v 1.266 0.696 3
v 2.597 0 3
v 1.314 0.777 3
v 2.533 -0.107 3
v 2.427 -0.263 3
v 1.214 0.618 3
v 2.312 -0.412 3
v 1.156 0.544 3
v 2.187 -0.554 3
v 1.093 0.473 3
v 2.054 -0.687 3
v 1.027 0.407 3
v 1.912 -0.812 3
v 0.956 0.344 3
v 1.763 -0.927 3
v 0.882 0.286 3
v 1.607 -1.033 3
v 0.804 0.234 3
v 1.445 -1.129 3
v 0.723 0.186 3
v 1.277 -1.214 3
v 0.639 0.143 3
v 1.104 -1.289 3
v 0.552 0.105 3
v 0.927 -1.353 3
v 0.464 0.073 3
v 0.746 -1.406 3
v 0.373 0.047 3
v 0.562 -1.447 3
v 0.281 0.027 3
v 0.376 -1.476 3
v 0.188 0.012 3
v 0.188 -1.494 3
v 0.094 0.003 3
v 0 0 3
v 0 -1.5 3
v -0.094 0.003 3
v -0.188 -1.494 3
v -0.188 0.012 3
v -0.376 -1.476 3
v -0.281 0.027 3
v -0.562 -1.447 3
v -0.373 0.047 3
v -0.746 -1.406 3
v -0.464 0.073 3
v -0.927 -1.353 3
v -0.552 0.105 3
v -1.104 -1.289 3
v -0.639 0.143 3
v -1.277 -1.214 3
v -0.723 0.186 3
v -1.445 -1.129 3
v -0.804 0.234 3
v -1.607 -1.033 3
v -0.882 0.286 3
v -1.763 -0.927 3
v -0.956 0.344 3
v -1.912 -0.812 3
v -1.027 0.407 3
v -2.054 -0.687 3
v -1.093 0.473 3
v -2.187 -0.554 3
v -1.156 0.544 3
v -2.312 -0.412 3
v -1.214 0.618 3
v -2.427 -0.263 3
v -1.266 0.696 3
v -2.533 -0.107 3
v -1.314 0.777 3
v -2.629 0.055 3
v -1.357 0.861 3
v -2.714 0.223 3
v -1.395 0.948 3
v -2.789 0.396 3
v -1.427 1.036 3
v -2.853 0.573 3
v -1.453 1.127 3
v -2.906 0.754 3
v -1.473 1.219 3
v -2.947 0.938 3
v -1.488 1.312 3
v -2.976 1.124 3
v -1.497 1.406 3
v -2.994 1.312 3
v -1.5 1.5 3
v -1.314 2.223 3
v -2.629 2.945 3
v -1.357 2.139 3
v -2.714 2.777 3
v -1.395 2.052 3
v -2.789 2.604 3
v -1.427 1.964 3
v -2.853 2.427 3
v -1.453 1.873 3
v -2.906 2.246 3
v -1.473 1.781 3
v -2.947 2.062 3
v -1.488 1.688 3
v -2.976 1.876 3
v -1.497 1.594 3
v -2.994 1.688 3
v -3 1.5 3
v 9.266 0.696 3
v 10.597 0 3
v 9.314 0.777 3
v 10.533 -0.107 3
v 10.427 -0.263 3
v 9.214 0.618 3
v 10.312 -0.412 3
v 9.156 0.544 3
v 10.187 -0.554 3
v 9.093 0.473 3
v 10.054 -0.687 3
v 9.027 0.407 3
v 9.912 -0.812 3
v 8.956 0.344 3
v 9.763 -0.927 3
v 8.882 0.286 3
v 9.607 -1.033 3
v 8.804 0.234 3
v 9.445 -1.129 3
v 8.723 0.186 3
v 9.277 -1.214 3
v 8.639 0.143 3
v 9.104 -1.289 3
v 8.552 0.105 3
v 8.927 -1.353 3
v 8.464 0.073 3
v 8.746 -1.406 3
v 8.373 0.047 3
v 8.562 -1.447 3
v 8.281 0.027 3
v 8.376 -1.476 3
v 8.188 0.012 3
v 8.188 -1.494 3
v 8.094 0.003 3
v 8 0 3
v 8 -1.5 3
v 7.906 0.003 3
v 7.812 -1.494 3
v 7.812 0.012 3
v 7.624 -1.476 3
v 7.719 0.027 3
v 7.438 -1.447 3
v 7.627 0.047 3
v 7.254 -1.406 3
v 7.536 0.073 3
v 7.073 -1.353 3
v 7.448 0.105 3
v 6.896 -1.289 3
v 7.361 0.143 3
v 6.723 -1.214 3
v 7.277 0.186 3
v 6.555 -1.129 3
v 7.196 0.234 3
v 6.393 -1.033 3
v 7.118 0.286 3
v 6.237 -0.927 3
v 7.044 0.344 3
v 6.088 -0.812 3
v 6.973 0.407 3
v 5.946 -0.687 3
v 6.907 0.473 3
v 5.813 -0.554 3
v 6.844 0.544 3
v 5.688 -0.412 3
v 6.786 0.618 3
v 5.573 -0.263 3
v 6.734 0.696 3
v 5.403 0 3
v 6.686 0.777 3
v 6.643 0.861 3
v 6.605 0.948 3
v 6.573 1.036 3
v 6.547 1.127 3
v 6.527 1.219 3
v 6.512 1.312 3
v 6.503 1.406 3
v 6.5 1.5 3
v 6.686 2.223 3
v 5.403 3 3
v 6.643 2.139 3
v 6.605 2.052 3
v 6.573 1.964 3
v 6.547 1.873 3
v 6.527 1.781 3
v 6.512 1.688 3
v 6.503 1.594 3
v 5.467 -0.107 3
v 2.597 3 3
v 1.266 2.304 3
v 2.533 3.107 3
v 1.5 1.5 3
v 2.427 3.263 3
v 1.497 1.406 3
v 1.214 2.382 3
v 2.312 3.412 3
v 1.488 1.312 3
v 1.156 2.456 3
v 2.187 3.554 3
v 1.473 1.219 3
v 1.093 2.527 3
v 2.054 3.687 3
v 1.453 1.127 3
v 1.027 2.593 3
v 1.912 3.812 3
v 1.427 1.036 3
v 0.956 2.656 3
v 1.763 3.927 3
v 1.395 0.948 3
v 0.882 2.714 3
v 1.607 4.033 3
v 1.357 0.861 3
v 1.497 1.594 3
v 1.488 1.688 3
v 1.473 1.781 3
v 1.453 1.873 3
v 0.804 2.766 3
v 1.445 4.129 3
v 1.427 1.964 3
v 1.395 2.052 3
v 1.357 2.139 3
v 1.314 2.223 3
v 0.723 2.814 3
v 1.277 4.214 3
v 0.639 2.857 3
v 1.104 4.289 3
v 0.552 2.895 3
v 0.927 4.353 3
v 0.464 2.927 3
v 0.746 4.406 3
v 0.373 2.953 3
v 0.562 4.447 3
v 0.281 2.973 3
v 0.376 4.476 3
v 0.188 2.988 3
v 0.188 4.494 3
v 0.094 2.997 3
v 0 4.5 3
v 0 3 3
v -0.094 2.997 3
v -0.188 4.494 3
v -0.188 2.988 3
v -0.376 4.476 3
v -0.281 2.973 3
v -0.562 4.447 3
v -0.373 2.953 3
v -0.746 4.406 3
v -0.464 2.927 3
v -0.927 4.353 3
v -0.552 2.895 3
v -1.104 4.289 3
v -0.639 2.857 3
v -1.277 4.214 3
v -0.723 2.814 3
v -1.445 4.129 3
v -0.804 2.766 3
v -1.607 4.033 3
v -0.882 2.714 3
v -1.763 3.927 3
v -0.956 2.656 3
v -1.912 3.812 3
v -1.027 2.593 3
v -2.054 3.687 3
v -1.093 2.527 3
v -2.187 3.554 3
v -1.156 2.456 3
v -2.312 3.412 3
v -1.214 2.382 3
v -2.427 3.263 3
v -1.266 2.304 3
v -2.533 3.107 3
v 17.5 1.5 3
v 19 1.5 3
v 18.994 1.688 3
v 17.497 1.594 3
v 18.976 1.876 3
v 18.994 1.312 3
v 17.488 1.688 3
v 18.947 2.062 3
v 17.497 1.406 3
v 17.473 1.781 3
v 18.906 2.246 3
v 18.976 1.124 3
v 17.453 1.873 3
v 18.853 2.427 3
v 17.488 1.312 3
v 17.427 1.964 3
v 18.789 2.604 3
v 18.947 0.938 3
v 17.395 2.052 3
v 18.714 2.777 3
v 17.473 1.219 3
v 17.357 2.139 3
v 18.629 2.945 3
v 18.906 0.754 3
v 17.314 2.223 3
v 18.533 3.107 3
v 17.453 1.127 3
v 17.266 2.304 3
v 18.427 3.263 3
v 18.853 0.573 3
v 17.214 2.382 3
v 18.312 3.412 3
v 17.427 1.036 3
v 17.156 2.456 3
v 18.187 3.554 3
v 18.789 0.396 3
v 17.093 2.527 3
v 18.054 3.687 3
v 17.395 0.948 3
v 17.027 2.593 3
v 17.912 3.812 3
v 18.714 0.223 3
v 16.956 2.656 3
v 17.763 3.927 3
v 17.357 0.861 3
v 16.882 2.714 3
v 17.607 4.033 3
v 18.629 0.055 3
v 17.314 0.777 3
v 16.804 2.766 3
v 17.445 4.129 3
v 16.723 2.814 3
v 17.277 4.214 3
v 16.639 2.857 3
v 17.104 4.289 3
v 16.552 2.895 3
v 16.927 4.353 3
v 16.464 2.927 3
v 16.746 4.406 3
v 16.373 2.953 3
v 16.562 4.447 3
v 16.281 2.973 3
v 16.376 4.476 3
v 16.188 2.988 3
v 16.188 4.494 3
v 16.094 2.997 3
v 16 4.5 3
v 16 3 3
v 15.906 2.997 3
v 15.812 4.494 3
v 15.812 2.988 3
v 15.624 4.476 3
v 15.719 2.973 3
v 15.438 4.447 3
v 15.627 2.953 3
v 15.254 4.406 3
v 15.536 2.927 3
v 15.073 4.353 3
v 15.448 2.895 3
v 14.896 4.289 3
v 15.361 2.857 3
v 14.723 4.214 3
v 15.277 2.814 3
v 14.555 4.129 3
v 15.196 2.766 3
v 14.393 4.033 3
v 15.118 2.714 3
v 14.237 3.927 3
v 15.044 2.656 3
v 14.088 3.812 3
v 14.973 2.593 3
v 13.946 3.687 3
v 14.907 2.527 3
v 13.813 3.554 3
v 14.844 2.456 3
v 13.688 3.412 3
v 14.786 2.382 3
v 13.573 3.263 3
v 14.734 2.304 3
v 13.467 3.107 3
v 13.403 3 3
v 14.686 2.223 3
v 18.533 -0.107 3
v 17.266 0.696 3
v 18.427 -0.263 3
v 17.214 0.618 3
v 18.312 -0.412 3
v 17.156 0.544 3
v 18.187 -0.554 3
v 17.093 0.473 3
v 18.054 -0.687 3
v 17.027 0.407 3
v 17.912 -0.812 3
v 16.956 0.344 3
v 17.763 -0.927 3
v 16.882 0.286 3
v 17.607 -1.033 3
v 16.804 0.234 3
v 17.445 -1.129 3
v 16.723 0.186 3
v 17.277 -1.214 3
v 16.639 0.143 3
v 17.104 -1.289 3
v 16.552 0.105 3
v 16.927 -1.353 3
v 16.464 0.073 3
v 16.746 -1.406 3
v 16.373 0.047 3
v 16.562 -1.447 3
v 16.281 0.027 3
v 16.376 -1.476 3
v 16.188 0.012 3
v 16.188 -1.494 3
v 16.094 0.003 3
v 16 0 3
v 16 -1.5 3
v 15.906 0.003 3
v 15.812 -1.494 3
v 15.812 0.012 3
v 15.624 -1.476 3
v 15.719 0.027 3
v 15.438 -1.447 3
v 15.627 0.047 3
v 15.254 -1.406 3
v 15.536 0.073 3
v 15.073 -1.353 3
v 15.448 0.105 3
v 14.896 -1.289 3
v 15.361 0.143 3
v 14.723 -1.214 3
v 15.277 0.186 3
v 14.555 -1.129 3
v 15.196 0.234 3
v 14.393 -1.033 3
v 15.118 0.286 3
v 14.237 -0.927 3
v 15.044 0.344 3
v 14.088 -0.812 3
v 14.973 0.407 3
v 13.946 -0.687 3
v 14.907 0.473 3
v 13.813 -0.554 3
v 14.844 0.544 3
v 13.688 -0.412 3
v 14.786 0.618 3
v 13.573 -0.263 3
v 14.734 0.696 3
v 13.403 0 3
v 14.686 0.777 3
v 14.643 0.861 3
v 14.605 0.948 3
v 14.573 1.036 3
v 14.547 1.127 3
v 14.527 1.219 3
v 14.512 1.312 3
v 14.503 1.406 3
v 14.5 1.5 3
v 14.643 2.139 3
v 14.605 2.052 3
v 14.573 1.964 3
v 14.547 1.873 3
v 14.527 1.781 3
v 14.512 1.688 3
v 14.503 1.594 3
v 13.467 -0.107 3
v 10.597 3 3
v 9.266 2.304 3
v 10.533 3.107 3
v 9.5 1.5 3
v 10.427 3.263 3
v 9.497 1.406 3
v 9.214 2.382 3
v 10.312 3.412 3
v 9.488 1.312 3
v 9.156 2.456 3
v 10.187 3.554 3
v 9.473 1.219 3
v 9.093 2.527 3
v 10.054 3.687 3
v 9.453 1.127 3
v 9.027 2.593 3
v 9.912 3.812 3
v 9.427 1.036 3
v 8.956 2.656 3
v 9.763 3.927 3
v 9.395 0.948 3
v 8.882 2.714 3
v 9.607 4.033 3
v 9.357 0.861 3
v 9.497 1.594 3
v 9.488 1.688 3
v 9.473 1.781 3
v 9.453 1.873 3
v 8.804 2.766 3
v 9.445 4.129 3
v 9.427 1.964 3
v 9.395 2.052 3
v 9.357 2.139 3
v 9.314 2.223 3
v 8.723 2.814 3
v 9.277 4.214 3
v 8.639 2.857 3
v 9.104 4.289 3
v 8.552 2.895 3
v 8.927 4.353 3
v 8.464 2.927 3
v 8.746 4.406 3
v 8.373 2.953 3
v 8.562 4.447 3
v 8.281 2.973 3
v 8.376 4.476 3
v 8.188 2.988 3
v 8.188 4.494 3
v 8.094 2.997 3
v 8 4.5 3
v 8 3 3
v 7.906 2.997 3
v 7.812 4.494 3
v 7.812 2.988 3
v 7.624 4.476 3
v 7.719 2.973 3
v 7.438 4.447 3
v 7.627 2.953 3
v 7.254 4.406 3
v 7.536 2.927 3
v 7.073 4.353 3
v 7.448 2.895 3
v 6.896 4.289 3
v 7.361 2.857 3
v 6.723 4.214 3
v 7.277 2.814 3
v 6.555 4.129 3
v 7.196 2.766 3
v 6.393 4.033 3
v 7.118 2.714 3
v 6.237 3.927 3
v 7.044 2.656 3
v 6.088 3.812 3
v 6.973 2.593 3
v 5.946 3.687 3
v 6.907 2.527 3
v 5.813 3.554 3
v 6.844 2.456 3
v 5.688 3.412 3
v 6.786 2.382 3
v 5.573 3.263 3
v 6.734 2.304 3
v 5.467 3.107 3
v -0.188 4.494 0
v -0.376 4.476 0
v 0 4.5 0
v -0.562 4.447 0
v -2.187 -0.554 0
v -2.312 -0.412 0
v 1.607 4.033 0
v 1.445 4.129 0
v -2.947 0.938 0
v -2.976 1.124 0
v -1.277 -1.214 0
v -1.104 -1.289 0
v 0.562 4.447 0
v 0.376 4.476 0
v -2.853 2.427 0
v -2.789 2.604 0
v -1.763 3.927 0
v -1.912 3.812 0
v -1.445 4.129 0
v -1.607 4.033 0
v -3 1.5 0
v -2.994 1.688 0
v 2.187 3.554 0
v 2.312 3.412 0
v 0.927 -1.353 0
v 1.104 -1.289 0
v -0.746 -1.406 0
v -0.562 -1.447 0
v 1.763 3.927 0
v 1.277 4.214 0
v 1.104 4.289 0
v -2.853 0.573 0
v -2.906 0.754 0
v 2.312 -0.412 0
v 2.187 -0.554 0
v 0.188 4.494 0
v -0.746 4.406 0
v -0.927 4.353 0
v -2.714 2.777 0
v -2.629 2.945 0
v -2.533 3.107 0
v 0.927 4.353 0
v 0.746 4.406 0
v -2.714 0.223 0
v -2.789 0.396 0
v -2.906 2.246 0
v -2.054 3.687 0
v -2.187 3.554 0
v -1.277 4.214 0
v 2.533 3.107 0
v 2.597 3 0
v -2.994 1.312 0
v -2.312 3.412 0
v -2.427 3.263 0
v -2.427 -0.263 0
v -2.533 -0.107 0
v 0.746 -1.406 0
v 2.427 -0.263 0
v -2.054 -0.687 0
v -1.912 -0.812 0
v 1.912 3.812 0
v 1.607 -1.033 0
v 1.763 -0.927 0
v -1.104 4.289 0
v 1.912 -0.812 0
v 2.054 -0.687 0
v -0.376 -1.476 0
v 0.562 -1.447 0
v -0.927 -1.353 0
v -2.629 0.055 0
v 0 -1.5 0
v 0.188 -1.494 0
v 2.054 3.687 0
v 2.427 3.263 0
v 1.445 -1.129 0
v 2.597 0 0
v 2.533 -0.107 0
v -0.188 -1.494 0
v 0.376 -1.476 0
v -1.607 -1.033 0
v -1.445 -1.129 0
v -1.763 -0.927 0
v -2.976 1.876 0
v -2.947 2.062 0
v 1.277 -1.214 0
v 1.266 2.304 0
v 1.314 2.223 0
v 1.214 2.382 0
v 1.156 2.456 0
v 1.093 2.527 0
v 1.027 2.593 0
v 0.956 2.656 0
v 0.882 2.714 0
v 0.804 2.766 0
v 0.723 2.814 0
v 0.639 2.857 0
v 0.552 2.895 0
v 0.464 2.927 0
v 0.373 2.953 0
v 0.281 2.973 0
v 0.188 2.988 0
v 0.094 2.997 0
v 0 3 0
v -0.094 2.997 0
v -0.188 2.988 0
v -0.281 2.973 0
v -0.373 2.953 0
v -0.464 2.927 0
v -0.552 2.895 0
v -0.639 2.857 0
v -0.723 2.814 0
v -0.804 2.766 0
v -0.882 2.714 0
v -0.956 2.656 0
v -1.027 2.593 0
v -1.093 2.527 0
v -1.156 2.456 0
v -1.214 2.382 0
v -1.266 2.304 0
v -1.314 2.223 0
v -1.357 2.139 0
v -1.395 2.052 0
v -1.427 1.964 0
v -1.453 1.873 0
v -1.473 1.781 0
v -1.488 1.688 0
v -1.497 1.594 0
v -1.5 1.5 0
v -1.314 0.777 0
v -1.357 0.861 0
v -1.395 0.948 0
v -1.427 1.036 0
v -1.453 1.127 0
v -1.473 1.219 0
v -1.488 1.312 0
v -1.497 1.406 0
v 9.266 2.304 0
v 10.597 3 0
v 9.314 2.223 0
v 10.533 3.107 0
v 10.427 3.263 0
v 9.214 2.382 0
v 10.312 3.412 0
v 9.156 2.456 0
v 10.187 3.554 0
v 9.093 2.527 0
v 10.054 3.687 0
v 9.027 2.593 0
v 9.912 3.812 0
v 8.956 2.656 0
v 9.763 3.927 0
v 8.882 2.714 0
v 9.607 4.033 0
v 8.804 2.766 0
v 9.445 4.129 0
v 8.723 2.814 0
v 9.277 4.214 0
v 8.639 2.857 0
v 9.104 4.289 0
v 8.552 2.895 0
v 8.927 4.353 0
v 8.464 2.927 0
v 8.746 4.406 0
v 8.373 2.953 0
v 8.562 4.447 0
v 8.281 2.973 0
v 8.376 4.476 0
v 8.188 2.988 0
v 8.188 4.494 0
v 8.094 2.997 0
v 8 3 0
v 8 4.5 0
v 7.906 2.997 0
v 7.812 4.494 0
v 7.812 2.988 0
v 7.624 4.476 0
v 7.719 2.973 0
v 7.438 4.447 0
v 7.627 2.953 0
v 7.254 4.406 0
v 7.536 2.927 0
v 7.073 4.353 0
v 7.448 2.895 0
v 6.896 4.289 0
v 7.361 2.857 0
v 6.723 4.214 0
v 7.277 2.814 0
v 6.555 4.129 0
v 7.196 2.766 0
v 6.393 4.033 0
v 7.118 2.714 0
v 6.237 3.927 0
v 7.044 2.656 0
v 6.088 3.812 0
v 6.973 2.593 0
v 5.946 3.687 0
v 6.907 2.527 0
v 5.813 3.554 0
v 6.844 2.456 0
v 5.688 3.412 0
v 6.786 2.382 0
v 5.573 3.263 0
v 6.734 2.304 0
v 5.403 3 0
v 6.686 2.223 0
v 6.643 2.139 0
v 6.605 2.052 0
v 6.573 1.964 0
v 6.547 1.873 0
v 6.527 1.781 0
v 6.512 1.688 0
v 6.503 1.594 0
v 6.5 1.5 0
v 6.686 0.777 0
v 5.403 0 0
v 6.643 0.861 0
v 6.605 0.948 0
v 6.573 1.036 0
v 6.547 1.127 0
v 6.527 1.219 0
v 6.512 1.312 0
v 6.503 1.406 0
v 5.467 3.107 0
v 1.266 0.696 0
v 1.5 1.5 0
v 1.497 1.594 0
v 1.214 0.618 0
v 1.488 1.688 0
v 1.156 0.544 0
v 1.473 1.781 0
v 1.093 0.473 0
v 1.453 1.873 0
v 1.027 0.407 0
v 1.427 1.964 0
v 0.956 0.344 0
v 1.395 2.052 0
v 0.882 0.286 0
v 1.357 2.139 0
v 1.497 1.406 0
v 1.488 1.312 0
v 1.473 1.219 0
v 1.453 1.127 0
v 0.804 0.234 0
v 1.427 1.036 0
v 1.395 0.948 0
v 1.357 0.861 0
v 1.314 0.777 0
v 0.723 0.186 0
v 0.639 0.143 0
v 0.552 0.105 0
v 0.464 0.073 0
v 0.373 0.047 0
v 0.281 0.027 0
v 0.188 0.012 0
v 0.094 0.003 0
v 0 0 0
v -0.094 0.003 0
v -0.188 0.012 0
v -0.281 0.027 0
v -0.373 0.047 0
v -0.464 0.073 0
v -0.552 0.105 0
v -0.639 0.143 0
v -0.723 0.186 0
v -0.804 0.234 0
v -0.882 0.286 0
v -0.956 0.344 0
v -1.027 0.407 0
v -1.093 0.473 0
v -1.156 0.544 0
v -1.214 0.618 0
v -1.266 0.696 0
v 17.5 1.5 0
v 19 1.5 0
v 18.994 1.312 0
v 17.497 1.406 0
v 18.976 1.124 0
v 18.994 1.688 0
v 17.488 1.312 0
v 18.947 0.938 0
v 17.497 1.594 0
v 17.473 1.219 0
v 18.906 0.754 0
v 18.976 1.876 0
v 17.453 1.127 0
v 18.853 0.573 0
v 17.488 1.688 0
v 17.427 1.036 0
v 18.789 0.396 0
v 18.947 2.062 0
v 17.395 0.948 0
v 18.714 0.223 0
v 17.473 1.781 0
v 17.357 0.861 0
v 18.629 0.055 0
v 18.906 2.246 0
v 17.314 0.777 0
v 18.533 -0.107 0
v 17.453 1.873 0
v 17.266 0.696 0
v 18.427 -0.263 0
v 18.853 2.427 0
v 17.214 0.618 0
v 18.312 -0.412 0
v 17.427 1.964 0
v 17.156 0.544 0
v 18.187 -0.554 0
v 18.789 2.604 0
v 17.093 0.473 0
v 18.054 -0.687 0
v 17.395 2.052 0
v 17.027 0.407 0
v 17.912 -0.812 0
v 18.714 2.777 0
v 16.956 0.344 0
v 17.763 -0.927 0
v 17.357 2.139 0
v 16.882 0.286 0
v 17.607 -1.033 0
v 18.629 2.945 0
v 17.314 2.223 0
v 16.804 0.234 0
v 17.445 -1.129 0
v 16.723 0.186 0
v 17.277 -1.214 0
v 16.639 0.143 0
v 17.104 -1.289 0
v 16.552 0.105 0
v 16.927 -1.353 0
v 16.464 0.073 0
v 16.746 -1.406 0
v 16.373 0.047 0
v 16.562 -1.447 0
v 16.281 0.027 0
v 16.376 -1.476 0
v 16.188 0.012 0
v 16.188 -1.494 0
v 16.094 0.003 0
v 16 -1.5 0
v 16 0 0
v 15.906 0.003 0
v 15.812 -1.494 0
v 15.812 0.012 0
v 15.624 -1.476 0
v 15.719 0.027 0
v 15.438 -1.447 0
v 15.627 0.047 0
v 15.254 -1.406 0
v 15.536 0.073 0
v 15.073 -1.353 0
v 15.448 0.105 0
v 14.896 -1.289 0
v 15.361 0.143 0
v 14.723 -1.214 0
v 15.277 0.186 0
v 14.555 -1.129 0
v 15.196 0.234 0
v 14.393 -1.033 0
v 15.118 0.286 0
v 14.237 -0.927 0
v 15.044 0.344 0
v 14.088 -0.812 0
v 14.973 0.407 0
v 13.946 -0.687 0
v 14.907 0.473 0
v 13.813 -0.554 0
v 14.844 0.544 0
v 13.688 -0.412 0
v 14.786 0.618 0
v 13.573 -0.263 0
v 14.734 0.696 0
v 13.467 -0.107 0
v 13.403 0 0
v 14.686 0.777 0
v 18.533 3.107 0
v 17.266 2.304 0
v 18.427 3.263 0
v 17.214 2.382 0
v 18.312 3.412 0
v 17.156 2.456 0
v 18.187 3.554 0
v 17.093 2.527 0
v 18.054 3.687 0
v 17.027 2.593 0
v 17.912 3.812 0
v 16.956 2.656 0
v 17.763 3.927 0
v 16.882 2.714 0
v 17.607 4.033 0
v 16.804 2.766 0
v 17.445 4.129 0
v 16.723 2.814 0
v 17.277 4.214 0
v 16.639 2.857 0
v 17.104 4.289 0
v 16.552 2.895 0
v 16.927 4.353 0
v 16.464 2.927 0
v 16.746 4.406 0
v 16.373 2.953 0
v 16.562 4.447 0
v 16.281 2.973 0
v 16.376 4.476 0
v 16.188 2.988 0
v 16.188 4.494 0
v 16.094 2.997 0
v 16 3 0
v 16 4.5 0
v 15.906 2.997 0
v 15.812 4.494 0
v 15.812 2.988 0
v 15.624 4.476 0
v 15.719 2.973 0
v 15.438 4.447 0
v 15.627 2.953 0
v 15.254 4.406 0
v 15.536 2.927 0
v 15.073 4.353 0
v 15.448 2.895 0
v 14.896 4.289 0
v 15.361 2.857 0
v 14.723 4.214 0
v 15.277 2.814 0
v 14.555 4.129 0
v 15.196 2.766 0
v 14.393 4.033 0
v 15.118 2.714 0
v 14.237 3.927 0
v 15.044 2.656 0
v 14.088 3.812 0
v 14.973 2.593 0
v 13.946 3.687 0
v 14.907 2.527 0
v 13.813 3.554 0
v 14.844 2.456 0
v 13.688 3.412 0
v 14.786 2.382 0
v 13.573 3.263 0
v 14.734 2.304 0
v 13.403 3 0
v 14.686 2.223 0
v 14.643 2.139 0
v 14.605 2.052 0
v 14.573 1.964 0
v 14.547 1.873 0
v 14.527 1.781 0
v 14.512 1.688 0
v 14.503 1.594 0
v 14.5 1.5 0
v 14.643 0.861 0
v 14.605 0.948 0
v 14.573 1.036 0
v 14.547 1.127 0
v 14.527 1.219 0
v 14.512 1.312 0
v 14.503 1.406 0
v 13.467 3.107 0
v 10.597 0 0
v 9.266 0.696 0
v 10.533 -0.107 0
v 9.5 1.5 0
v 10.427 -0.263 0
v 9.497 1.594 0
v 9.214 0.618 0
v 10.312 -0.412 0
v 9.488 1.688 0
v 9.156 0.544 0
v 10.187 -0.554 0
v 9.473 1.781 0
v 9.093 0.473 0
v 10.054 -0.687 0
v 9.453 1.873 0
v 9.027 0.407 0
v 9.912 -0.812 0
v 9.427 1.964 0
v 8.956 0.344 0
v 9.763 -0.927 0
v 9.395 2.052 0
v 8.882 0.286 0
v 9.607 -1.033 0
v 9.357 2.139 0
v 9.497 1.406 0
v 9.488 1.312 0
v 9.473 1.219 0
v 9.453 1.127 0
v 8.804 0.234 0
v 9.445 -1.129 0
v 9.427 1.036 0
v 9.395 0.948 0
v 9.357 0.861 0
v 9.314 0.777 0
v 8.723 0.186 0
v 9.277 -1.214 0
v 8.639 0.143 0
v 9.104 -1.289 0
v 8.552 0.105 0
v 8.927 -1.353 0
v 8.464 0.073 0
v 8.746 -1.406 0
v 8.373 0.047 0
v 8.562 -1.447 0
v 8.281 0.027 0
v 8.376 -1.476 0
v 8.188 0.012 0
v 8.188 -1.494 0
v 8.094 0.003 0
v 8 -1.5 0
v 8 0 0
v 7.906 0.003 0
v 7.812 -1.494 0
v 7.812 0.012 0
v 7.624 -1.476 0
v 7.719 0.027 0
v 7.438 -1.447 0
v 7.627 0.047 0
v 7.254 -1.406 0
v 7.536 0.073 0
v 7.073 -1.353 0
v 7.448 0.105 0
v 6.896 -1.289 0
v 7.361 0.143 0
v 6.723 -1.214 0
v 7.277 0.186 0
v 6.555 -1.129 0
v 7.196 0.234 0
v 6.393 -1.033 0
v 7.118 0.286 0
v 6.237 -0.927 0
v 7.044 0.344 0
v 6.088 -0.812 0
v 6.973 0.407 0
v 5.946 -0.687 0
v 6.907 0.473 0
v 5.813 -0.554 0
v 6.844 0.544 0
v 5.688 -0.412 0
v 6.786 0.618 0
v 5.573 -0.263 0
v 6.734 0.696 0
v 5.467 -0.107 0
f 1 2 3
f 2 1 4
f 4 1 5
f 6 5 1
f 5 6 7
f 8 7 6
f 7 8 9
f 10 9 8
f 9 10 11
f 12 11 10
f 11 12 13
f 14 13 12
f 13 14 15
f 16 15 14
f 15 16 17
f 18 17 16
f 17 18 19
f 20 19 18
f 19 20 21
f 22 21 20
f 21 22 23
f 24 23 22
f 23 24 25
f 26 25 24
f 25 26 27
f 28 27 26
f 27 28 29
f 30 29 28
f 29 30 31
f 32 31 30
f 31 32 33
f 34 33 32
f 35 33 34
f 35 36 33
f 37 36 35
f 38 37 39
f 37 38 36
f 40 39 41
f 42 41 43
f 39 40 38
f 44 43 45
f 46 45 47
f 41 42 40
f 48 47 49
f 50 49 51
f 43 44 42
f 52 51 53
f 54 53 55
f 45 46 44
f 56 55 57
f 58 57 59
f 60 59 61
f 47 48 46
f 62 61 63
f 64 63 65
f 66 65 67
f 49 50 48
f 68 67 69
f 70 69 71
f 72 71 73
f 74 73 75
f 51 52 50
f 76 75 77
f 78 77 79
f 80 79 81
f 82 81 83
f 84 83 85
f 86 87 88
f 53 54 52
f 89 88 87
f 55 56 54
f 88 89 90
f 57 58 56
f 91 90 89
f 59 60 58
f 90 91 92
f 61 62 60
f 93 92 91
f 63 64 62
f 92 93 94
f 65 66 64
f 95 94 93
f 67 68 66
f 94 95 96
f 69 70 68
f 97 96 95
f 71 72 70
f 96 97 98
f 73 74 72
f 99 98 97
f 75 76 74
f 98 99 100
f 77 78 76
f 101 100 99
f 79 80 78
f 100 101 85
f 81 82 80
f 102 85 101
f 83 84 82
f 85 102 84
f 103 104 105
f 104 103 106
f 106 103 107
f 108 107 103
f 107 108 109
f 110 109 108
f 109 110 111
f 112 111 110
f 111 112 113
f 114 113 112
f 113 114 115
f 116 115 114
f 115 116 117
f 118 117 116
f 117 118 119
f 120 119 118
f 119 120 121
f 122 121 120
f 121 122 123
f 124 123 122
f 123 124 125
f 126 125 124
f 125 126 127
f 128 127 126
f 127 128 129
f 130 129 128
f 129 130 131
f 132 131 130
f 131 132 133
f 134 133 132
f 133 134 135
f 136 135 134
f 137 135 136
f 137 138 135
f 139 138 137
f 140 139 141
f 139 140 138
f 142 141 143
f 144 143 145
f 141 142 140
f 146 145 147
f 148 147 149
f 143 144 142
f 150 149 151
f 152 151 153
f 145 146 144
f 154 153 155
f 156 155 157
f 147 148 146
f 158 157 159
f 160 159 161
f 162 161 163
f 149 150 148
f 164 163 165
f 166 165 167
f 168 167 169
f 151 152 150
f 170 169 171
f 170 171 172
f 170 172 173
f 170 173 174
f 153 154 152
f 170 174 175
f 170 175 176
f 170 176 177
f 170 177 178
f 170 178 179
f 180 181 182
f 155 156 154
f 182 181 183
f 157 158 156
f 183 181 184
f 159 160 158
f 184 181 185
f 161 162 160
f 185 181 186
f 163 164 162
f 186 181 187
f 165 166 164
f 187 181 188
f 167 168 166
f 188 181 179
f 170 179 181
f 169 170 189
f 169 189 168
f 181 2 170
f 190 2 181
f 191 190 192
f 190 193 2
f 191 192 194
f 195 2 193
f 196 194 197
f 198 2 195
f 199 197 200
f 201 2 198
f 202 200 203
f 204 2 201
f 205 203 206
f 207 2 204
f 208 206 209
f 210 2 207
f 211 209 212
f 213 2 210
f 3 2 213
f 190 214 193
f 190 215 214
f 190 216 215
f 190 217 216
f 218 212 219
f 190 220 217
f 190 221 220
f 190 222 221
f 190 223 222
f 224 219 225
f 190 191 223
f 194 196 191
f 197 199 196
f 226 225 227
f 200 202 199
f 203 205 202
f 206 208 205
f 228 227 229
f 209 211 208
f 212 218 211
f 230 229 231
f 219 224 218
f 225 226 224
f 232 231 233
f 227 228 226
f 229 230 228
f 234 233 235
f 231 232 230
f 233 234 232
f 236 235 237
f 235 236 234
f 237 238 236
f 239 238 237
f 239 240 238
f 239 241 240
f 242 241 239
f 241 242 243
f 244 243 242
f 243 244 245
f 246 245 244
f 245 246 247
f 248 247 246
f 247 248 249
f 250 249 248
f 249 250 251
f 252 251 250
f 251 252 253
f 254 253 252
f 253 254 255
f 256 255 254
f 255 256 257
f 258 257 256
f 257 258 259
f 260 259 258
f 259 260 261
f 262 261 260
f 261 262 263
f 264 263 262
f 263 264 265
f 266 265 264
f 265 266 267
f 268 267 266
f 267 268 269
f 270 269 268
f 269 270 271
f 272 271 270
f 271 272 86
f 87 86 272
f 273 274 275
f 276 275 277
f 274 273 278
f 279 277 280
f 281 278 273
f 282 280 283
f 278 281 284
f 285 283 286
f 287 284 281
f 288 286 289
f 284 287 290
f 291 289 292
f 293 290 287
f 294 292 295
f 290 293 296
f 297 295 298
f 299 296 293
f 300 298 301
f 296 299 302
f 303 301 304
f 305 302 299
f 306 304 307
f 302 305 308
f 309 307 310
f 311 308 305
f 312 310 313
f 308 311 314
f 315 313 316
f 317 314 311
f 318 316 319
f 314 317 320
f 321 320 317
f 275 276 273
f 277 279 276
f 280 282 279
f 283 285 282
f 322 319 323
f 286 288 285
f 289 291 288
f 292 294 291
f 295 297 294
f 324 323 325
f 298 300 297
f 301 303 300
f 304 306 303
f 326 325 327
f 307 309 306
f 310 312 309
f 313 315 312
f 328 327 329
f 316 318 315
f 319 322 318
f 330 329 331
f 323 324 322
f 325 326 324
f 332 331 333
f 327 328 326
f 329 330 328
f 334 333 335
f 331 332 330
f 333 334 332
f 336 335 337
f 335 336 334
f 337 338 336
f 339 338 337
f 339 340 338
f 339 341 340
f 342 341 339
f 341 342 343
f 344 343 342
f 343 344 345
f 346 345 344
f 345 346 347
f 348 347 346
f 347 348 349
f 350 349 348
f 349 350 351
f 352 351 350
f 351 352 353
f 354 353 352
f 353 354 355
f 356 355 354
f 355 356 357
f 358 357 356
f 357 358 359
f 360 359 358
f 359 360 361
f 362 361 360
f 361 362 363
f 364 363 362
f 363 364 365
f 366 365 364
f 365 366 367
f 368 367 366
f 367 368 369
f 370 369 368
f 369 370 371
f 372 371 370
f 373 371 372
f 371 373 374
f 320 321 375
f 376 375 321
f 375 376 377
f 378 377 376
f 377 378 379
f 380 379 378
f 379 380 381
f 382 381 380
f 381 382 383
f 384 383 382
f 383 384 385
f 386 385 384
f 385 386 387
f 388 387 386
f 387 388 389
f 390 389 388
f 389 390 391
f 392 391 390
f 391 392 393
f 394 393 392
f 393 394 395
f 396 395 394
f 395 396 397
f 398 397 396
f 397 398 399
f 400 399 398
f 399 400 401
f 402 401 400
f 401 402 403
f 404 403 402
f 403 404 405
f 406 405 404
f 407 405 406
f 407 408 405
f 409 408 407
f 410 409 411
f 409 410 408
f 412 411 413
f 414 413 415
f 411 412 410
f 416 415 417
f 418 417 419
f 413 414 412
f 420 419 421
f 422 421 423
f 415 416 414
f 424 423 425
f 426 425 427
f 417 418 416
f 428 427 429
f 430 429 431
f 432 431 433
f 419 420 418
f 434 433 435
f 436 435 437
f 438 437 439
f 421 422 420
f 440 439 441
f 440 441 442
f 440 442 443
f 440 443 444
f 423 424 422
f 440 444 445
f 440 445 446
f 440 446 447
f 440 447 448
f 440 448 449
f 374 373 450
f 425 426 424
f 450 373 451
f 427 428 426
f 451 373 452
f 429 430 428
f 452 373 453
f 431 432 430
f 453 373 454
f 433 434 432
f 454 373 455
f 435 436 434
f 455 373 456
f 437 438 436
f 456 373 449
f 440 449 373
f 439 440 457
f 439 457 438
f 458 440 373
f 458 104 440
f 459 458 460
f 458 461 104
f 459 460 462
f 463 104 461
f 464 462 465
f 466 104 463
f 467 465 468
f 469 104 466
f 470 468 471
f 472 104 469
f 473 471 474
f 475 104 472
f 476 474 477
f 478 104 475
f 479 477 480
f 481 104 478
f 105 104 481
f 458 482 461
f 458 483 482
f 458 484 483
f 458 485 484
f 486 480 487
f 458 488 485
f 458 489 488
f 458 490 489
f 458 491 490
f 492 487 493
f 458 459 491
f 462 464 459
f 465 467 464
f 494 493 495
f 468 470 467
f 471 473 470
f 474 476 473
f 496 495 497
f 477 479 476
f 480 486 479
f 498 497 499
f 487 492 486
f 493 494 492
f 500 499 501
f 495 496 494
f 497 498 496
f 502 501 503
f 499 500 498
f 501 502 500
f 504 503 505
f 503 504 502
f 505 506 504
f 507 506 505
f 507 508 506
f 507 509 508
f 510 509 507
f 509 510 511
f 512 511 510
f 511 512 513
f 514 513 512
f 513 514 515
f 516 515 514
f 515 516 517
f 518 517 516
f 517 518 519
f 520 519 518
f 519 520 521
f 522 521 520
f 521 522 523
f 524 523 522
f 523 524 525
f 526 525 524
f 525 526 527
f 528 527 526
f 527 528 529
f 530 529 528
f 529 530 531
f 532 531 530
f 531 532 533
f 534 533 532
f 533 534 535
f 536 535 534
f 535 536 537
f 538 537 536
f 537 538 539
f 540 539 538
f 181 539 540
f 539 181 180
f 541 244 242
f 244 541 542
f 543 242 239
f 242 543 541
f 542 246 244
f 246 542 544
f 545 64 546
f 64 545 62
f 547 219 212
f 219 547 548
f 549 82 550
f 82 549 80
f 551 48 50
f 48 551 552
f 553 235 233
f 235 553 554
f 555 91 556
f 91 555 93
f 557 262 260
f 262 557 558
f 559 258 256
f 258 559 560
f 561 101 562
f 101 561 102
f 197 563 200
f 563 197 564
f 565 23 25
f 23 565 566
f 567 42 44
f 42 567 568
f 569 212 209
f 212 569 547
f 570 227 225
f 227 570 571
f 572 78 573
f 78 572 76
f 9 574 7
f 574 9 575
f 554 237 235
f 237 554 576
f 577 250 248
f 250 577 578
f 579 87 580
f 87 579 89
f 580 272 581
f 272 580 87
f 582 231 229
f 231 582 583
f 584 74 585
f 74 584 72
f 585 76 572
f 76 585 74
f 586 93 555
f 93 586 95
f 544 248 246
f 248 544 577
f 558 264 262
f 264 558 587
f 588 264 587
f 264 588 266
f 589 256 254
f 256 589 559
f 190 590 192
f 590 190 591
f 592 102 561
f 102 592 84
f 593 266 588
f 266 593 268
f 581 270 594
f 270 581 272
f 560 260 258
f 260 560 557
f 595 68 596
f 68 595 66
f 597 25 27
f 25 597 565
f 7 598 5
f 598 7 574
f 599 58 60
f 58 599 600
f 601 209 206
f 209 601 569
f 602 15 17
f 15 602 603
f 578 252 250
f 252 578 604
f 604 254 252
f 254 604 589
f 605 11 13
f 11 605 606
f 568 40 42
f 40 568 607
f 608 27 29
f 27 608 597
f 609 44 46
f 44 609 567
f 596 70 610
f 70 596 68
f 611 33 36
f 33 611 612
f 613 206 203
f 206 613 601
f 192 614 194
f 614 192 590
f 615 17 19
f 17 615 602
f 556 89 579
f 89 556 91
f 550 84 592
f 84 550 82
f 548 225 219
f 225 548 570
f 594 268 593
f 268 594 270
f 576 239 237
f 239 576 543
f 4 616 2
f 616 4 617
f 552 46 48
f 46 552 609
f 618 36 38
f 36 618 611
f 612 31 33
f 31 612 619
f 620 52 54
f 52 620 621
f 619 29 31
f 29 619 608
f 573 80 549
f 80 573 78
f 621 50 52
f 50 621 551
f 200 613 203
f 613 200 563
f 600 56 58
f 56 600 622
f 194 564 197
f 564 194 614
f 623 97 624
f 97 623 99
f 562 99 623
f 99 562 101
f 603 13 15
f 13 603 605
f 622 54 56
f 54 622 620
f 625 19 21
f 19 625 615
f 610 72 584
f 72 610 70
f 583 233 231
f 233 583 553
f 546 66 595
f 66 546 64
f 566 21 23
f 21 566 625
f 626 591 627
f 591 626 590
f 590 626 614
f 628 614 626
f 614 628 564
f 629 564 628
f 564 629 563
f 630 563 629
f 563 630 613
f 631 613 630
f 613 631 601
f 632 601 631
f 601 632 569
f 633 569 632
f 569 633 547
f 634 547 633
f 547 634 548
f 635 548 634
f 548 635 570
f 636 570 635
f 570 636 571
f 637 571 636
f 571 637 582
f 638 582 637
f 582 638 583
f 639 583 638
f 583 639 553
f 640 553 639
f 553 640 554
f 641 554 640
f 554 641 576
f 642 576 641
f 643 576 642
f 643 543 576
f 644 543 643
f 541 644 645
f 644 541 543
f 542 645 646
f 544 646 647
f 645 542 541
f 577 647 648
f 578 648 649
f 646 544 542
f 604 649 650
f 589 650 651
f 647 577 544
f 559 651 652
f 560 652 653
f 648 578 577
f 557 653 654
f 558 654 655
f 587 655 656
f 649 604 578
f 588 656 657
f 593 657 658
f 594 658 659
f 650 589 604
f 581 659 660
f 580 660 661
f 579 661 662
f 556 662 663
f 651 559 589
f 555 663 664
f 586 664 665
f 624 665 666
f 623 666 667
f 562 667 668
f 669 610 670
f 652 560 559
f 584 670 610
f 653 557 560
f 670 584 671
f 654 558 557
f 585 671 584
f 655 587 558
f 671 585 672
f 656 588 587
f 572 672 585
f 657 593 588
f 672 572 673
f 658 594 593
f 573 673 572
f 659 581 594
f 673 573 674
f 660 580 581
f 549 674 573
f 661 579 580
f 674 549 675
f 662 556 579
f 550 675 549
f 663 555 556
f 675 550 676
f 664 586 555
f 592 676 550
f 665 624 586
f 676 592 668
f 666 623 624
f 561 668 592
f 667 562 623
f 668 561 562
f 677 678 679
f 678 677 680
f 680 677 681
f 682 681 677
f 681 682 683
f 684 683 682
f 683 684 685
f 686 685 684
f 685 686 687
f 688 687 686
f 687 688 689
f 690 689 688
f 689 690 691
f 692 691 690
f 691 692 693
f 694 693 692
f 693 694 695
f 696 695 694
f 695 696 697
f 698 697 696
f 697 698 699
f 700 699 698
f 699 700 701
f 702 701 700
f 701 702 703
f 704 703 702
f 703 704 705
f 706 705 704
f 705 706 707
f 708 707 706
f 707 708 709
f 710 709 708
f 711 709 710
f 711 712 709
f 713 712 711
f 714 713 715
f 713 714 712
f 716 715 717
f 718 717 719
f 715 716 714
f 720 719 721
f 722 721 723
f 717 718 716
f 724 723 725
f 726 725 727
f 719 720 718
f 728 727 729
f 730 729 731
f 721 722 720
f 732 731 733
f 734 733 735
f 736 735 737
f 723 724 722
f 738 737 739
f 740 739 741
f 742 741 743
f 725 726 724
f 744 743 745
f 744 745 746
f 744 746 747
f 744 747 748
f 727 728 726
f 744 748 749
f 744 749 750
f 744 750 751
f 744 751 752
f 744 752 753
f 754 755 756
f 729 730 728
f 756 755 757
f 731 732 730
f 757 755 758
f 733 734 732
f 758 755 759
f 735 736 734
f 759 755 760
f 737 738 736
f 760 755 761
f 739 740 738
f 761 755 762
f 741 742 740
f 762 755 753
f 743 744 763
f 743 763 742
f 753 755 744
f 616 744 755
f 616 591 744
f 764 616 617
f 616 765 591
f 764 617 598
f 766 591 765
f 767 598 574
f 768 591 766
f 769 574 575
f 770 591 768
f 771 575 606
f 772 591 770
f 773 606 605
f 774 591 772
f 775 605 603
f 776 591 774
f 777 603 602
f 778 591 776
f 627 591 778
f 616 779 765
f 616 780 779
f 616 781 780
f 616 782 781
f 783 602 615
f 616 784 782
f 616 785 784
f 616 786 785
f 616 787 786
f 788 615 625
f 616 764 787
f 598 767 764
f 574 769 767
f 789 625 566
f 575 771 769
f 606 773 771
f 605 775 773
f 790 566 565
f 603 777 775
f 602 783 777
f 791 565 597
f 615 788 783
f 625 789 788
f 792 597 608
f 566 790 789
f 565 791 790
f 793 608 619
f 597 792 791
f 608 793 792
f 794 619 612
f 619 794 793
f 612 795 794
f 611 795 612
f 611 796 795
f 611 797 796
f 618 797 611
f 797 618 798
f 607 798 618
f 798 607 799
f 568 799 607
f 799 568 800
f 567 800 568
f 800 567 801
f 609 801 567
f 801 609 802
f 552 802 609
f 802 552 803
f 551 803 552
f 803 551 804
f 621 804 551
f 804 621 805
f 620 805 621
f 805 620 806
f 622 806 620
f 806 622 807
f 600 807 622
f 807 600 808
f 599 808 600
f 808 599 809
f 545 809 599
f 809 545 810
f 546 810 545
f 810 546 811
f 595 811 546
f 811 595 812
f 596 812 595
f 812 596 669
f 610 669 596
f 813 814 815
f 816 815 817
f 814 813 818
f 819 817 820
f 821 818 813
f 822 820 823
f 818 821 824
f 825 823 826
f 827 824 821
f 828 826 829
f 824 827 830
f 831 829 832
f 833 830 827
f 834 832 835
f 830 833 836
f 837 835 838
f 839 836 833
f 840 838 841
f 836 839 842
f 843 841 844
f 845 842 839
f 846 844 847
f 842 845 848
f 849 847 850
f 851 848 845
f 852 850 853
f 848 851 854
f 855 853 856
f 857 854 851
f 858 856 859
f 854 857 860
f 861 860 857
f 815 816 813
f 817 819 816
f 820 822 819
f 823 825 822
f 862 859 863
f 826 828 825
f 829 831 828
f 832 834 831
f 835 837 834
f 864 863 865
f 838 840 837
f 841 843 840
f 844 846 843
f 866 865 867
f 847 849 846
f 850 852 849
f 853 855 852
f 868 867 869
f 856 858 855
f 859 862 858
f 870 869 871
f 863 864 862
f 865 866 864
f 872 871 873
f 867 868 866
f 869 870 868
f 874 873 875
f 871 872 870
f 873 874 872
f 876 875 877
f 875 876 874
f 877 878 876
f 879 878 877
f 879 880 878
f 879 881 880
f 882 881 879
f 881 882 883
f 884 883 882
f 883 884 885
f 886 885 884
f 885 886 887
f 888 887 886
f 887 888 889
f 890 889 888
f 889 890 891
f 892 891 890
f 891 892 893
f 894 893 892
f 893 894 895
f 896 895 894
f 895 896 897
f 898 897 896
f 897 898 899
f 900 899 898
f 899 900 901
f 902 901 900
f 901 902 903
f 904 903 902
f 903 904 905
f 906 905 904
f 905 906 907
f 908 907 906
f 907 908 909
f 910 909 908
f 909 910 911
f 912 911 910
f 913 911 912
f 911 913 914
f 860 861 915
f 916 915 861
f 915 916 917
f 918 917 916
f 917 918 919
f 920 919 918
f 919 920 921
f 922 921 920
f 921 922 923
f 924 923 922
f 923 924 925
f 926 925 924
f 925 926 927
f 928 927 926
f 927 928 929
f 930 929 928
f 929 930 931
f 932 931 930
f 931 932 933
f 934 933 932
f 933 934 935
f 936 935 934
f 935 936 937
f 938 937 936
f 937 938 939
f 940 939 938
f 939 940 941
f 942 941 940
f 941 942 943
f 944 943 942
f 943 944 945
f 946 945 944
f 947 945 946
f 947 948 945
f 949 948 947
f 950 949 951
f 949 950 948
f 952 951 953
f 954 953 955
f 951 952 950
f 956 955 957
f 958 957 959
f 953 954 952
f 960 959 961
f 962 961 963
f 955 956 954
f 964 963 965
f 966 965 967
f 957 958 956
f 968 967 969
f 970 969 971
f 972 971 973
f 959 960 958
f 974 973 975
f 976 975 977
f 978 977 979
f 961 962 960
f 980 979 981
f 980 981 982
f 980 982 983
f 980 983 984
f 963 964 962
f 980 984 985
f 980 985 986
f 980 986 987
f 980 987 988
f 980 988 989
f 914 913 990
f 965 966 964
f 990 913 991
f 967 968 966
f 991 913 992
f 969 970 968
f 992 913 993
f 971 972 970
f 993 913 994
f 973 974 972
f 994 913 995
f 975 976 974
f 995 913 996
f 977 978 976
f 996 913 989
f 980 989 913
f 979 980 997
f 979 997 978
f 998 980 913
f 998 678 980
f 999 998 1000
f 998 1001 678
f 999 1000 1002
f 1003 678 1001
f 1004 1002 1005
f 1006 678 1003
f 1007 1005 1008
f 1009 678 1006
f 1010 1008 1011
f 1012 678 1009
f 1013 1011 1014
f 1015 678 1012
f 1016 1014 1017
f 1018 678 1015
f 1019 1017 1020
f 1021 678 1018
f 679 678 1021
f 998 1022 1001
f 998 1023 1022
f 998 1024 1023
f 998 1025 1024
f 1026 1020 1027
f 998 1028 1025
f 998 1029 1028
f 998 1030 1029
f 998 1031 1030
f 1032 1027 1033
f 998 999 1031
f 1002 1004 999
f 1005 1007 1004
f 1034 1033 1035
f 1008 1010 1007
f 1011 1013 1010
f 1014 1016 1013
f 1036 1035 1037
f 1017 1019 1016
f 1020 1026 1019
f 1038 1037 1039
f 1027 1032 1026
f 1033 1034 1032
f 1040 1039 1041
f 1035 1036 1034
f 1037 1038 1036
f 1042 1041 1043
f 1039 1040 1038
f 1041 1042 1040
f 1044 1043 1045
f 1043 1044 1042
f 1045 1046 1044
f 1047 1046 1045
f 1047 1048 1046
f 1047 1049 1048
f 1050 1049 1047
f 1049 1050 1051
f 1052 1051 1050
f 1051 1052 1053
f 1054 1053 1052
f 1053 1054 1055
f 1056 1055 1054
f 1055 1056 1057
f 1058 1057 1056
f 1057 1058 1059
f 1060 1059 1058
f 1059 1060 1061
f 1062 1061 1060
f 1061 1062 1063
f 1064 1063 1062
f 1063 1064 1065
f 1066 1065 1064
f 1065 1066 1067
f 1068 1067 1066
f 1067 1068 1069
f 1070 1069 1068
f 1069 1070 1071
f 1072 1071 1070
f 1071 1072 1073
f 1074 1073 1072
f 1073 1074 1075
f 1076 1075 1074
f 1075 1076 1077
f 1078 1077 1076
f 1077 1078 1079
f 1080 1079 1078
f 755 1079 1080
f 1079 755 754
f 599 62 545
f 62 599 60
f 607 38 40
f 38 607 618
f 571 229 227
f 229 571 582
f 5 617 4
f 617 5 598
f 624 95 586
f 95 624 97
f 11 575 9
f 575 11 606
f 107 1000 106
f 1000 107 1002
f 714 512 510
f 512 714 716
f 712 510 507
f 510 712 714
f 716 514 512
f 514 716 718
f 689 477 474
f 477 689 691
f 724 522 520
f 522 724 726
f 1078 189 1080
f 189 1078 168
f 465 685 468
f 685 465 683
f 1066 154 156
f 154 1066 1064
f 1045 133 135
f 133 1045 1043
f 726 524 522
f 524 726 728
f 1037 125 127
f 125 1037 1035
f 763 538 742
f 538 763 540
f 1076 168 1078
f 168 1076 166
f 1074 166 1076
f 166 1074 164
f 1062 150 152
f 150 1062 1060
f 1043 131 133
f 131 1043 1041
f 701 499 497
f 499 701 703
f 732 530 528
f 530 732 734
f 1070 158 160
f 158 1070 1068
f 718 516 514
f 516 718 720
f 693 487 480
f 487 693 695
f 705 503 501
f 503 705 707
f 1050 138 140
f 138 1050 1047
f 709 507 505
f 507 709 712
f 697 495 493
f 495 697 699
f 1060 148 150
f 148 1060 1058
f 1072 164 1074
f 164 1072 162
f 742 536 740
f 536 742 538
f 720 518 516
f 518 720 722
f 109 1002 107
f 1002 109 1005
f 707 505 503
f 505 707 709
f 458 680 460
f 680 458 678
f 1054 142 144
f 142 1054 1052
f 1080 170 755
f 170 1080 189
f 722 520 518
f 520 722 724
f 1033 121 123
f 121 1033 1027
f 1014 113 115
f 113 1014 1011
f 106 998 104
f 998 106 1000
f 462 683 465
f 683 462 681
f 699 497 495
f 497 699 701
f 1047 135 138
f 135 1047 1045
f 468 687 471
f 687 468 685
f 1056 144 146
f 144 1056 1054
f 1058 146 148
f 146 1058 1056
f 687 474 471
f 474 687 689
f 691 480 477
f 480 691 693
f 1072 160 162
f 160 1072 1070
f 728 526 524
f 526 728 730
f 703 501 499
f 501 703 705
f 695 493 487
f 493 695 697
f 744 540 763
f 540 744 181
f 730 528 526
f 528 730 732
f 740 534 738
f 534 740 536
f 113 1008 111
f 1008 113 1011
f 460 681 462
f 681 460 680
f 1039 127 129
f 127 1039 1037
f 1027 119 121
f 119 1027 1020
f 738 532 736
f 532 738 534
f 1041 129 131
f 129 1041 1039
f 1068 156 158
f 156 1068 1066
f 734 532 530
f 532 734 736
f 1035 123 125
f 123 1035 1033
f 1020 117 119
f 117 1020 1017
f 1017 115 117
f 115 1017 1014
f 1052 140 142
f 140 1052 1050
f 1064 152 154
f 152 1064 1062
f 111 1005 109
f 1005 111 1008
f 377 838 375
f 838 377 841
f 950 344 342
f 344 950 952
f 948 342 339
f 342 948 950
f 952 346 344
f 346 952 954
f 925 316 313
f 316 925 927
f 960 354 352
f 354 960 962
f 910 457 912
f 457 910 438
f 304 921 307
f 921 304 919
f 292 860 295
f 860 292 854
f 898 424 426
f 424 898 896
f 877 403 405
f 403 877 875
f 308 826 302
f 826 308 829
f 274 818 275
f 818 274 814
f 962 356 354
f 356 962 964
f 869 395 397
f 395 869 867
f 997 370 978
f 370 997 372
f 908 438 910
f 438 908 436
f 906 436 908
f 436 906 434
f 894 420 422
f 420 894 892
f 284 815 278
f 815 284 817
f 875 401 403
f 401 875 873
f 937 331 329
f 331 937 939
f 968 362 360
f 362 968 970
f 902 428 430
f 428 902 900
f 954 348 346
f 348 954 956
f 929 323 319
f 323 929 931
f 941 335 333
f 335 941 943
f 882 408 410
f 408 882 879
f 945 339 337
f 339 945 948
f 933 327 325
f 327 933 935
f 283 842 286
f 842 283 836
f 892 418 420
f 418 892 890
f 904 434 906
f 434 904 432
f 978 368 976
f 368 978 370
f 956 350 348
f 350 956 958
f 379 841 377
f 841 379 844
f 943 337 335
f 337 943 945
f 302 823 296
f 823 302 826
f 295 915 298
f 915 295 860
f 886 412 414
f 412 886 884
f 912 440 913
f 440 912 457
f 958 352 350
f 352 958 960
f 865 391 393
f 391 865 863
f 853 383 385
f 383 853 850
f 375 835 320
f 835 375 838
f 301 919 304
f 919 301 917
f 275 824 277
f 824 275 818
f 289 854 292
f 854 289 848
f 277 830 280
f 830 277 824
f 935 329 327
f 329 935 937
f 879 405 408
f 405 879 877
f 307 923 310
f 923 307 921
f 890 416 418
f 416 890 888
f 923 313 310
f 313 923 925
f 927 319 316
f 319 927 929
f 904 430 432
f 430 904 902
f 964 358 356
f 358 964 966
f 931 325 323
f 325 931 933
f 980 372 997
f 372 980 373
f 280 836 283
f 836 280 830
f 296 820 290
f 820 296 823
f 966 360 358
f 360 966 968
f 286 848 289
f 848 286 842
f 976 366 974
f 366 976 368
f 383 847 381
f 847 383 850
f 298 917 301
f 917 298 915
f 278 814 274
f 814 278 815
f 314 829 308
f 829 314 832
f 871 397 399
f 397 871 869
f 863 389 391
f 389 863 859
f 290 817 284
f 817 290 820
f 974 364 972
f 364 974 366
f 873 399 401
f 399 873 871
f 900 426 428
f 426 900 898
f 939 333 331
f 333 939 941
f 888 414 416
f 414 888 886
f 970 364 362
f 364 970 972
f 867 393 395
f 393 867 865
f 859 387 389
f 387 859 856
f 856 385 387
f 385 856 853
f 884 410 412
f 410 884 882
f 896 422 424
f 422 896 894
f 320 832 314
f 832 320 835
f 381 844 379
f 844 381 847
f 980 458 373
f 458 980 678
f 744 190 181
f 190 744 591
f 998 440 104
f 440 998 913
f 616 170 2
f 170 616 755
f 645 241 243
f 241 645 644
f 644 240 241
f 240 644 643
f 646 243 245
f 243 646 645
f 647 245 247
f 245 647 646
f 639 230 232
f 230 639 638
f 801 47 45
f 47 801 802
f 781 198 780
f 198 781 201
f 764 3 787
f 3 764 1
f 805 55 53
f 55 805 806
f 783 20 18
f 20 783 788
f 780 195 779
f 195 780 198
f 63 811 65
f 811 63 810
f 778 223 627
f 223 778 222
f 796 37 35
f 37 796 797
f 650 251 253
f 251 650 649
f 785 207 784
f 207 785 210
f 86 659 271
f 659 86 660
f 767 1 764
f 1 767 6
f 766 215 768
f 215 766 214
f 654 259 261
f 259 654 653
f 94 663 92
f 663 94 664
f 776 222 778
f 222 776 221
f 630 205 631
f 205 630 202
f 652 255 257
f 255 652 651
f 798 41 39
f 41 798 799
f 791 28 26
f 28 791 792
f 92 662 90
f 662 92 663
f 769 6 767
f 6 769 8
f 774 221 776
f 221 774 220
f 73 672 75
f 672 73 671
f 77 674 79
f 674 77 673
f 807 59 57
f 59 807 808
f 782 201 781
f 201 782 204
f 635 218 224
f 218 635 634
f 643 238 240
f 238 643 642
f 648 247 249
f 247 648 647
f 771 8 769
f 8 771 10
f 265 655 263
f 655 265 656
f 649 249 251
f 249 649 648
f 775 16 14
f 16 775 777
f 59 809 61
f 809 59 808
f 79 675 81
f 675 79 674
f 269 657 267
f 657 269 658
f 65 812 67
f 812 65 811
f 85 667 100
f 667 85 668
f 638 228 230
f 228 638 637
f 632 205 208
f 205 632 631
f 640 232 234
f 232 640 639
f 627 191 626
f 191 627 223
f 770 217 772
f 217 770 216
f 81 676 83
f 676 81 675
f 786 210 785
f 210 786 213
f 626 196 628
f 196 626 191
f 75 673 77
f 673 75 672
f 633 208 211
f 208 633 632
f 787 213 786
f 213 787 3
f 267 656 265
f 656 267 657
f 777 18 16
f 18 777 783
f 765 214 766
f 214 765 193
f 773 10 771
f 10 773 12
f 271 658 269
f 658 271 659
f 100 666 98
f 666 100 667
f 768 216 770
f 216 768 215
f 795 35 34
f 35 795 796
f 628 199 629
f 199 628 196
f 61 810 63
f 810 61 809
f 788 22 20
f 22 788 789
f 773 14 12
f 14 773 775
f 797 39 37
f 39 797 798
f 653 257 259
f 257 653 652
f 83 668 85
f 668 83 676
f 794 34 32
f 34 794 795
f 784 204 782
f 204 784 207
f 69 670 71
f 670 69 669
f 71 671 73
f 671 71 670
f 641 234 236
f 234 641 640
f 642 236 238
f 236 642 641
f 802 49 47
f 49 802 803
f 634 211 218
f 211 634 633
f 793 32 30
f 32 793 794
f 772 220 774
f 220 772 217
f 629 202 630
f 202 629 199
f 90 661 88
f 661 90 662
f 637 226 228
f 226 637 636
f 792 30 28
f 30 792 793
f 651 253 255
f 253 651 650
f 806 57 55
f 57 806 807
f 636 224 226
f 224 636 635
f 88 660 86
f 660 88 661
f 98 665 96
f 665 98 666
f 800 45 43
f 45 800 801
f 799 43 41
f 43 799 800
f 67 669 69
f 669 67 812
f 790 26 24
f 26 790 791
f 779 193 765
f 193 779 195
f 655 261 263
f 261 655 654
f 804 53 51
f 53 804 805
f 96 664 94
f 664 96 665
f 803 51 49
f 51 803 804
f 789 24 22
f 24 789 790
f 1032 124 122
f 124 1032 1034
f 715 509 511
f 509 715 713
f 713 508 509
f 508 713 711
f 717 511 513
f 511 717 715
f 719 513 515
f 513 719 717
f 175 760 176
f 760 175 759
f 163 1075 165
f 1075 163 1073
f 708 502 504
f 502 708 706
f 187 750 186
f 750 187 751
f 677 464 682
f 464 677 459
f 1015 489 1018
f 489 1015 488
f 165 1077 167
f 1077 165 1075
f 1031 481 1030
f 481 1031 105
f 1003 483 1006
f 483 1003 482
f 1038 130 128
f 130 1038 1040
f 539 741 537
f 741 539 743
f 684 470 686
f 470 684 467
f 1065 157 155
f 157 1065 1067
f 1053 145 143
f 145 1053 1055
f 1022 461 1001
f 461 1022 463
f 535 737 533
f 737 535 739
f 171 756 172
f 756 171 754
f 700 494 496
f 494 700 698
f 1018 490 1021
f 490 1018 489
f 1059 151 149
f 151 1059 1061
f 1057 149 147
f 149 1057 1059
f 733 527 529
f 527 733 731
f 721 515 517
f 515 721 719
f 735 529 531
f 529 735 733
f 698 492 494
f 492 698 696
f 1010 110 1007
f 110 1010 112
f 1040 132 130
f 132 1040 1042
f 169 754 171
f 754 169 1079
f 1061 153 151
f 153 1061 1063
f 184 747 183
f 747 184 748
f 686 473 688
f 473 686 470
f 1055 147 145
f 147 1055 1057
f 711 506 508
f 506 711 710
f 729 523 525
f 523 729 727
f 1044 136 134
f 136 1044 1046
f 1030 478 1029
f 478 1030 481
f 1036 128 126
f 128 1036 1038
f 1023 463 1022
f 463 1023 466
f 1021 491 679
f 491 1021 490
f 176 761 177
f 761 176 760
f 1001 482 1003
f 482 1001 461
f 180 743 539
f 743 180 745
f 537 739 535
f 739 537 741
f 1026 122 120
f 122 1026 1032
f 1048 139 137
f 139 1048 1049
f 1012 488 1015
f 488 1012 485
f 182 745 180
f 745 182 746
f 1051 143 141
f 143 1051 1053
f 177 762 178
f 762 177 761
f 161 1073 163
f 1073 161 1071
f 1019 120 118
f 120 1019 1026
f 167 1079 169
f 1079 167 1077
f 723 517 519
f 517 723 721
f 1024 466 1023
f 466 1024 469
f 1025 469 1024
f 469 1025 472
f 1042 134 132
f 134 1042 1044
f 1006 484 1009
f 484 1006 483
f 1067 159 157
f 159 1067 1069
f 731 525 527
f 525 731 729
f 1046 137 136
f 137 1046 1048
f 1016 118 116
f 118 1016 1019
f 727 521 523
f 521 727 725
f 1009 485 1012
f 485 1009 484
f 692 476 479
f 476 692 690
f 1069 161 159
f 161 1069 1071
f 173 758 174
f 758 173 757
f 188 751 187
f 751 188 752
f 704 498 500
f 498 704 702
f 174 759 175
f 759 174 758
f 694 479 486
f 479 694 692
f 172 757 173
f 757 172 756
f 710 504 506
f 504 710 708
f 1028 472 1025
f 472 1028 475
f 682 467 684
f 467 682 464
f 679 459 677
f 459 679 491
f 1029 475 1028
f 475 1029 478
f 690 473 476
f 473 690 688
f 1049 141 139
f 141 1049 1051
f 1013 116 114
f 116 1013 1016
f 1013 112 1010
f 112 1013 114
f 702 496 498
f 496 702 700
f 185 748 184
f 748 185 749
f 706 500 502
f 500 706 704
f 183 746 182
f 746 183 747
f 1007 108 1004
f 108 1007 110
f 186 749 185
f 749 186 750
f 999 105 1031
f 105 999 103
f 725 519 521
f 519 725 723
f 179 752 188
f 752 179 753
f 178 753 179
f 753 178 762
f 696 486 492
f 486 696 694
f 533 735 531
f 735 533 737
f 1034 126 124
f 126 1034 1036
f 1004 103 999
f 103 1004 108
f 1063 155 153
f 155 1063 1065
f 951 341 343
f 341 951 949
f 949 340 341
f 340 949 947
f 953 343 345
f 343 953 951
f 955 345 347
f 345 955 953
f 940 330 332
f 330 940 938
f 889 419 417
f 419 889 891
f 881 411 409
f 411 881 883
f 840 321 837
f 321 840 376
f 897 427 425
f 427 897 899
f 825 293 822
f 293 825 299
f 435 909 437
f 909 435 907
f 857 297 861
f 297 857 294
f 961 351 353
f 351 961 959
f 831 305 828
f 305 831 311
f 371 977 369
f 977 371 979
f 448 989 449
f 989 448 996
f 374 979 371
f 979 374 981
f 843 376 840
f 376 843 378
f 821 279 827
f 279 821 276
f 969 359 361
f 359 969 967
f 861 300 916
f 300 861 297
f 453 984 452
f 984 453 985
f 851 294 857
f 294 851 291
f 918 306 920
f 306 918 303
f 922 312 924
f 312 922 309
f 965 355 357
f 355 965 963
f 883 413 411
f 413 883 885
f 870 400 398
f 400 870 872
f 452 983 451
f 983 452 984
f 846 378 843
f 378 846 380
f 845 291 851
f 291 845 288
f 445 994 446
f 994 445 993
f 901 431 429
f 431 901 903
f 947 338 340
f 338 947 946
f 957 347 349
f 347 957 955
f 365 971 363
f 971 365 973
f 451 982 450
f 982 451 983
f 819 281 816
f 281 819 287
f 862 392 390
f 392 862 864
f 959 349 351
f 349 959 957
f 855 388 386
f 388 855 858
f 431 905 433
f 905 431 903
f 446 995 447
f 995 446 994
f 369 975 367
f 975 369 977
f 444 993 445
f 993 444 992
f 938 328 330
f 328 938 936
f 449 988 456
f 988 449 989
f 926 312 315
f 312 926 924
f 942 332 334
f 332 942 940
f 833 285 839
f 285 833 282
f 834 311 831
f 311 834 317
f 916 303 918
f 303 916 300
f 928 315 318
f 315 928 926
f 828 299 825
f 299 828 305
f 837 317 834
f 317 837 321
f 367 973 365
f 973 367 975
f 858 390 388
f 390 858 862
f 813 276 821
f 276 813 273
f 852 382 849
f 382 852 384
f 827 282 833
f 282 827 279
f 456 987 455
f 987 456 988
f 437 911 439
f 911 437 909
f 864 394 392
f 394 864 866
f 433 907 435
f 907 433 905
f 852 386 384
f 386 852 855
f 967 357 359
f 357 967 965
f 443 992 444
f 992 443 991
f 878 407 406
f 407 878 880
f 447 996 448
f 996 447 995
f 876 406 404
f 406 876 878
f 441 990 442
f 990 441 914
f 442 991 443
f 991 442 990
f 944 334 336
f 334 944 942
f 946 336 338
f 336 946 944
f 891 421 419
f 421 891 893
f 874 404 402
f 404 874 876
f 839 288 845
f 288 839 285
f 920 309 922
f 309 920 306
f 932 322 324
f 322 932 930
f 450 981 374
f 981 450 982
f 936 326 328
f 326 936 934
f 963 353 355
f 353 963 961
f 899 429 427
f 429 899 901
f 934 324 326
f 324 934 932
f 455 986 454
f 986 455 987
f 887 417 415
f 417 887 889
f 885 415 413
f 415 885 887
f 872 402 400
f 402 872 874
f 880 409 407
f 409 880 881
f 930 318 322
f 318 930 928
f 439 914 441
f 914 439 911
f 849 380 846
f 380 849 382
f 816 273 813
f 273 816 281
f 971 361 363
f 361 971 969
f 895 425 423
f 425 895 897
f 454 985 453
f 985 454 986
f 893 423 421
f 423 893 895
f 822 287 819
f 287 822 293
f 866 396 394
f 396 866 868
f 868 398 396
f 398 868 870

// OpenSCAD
difference(){
	union(){


        translate([0,1.5,0]){
            rotate([0,0,90]){
                cylinder(h=3, r=3, $fn=100, center=false);
            }
        }
        translate([8,1.5,0]){
            rotate([0,0,90]){
                cylinder(h=3, r=3, $fn=100, center=false);
            }
        }
        translate([16,1.5,0]){
            rotate([0,0,90]){
                cylinder(h=3, r=3, $fn=100, center=false);
            }
        }

        translate([0,0,0]){
           cube([16,3,3], center=false);
        }
        
	}
	union() {

        translate([0,1.5,-1]){
            rotate([0,0,90]){
                cylinder(h=5, r=1.5, $fn=100, center=false);
            }
        }
        translate([8,1.5,-1]){
            rotate([0,0,90]){
                cylinder(h=5, r=1.5, $fn=100, center=false);
            }
        }
        translate([16,1.5,-1]){
            rotate([0,0,90]){
                cylinder(h=5, r=1.5, $fn=100, center=false);
            }
        }

        


	}
}
